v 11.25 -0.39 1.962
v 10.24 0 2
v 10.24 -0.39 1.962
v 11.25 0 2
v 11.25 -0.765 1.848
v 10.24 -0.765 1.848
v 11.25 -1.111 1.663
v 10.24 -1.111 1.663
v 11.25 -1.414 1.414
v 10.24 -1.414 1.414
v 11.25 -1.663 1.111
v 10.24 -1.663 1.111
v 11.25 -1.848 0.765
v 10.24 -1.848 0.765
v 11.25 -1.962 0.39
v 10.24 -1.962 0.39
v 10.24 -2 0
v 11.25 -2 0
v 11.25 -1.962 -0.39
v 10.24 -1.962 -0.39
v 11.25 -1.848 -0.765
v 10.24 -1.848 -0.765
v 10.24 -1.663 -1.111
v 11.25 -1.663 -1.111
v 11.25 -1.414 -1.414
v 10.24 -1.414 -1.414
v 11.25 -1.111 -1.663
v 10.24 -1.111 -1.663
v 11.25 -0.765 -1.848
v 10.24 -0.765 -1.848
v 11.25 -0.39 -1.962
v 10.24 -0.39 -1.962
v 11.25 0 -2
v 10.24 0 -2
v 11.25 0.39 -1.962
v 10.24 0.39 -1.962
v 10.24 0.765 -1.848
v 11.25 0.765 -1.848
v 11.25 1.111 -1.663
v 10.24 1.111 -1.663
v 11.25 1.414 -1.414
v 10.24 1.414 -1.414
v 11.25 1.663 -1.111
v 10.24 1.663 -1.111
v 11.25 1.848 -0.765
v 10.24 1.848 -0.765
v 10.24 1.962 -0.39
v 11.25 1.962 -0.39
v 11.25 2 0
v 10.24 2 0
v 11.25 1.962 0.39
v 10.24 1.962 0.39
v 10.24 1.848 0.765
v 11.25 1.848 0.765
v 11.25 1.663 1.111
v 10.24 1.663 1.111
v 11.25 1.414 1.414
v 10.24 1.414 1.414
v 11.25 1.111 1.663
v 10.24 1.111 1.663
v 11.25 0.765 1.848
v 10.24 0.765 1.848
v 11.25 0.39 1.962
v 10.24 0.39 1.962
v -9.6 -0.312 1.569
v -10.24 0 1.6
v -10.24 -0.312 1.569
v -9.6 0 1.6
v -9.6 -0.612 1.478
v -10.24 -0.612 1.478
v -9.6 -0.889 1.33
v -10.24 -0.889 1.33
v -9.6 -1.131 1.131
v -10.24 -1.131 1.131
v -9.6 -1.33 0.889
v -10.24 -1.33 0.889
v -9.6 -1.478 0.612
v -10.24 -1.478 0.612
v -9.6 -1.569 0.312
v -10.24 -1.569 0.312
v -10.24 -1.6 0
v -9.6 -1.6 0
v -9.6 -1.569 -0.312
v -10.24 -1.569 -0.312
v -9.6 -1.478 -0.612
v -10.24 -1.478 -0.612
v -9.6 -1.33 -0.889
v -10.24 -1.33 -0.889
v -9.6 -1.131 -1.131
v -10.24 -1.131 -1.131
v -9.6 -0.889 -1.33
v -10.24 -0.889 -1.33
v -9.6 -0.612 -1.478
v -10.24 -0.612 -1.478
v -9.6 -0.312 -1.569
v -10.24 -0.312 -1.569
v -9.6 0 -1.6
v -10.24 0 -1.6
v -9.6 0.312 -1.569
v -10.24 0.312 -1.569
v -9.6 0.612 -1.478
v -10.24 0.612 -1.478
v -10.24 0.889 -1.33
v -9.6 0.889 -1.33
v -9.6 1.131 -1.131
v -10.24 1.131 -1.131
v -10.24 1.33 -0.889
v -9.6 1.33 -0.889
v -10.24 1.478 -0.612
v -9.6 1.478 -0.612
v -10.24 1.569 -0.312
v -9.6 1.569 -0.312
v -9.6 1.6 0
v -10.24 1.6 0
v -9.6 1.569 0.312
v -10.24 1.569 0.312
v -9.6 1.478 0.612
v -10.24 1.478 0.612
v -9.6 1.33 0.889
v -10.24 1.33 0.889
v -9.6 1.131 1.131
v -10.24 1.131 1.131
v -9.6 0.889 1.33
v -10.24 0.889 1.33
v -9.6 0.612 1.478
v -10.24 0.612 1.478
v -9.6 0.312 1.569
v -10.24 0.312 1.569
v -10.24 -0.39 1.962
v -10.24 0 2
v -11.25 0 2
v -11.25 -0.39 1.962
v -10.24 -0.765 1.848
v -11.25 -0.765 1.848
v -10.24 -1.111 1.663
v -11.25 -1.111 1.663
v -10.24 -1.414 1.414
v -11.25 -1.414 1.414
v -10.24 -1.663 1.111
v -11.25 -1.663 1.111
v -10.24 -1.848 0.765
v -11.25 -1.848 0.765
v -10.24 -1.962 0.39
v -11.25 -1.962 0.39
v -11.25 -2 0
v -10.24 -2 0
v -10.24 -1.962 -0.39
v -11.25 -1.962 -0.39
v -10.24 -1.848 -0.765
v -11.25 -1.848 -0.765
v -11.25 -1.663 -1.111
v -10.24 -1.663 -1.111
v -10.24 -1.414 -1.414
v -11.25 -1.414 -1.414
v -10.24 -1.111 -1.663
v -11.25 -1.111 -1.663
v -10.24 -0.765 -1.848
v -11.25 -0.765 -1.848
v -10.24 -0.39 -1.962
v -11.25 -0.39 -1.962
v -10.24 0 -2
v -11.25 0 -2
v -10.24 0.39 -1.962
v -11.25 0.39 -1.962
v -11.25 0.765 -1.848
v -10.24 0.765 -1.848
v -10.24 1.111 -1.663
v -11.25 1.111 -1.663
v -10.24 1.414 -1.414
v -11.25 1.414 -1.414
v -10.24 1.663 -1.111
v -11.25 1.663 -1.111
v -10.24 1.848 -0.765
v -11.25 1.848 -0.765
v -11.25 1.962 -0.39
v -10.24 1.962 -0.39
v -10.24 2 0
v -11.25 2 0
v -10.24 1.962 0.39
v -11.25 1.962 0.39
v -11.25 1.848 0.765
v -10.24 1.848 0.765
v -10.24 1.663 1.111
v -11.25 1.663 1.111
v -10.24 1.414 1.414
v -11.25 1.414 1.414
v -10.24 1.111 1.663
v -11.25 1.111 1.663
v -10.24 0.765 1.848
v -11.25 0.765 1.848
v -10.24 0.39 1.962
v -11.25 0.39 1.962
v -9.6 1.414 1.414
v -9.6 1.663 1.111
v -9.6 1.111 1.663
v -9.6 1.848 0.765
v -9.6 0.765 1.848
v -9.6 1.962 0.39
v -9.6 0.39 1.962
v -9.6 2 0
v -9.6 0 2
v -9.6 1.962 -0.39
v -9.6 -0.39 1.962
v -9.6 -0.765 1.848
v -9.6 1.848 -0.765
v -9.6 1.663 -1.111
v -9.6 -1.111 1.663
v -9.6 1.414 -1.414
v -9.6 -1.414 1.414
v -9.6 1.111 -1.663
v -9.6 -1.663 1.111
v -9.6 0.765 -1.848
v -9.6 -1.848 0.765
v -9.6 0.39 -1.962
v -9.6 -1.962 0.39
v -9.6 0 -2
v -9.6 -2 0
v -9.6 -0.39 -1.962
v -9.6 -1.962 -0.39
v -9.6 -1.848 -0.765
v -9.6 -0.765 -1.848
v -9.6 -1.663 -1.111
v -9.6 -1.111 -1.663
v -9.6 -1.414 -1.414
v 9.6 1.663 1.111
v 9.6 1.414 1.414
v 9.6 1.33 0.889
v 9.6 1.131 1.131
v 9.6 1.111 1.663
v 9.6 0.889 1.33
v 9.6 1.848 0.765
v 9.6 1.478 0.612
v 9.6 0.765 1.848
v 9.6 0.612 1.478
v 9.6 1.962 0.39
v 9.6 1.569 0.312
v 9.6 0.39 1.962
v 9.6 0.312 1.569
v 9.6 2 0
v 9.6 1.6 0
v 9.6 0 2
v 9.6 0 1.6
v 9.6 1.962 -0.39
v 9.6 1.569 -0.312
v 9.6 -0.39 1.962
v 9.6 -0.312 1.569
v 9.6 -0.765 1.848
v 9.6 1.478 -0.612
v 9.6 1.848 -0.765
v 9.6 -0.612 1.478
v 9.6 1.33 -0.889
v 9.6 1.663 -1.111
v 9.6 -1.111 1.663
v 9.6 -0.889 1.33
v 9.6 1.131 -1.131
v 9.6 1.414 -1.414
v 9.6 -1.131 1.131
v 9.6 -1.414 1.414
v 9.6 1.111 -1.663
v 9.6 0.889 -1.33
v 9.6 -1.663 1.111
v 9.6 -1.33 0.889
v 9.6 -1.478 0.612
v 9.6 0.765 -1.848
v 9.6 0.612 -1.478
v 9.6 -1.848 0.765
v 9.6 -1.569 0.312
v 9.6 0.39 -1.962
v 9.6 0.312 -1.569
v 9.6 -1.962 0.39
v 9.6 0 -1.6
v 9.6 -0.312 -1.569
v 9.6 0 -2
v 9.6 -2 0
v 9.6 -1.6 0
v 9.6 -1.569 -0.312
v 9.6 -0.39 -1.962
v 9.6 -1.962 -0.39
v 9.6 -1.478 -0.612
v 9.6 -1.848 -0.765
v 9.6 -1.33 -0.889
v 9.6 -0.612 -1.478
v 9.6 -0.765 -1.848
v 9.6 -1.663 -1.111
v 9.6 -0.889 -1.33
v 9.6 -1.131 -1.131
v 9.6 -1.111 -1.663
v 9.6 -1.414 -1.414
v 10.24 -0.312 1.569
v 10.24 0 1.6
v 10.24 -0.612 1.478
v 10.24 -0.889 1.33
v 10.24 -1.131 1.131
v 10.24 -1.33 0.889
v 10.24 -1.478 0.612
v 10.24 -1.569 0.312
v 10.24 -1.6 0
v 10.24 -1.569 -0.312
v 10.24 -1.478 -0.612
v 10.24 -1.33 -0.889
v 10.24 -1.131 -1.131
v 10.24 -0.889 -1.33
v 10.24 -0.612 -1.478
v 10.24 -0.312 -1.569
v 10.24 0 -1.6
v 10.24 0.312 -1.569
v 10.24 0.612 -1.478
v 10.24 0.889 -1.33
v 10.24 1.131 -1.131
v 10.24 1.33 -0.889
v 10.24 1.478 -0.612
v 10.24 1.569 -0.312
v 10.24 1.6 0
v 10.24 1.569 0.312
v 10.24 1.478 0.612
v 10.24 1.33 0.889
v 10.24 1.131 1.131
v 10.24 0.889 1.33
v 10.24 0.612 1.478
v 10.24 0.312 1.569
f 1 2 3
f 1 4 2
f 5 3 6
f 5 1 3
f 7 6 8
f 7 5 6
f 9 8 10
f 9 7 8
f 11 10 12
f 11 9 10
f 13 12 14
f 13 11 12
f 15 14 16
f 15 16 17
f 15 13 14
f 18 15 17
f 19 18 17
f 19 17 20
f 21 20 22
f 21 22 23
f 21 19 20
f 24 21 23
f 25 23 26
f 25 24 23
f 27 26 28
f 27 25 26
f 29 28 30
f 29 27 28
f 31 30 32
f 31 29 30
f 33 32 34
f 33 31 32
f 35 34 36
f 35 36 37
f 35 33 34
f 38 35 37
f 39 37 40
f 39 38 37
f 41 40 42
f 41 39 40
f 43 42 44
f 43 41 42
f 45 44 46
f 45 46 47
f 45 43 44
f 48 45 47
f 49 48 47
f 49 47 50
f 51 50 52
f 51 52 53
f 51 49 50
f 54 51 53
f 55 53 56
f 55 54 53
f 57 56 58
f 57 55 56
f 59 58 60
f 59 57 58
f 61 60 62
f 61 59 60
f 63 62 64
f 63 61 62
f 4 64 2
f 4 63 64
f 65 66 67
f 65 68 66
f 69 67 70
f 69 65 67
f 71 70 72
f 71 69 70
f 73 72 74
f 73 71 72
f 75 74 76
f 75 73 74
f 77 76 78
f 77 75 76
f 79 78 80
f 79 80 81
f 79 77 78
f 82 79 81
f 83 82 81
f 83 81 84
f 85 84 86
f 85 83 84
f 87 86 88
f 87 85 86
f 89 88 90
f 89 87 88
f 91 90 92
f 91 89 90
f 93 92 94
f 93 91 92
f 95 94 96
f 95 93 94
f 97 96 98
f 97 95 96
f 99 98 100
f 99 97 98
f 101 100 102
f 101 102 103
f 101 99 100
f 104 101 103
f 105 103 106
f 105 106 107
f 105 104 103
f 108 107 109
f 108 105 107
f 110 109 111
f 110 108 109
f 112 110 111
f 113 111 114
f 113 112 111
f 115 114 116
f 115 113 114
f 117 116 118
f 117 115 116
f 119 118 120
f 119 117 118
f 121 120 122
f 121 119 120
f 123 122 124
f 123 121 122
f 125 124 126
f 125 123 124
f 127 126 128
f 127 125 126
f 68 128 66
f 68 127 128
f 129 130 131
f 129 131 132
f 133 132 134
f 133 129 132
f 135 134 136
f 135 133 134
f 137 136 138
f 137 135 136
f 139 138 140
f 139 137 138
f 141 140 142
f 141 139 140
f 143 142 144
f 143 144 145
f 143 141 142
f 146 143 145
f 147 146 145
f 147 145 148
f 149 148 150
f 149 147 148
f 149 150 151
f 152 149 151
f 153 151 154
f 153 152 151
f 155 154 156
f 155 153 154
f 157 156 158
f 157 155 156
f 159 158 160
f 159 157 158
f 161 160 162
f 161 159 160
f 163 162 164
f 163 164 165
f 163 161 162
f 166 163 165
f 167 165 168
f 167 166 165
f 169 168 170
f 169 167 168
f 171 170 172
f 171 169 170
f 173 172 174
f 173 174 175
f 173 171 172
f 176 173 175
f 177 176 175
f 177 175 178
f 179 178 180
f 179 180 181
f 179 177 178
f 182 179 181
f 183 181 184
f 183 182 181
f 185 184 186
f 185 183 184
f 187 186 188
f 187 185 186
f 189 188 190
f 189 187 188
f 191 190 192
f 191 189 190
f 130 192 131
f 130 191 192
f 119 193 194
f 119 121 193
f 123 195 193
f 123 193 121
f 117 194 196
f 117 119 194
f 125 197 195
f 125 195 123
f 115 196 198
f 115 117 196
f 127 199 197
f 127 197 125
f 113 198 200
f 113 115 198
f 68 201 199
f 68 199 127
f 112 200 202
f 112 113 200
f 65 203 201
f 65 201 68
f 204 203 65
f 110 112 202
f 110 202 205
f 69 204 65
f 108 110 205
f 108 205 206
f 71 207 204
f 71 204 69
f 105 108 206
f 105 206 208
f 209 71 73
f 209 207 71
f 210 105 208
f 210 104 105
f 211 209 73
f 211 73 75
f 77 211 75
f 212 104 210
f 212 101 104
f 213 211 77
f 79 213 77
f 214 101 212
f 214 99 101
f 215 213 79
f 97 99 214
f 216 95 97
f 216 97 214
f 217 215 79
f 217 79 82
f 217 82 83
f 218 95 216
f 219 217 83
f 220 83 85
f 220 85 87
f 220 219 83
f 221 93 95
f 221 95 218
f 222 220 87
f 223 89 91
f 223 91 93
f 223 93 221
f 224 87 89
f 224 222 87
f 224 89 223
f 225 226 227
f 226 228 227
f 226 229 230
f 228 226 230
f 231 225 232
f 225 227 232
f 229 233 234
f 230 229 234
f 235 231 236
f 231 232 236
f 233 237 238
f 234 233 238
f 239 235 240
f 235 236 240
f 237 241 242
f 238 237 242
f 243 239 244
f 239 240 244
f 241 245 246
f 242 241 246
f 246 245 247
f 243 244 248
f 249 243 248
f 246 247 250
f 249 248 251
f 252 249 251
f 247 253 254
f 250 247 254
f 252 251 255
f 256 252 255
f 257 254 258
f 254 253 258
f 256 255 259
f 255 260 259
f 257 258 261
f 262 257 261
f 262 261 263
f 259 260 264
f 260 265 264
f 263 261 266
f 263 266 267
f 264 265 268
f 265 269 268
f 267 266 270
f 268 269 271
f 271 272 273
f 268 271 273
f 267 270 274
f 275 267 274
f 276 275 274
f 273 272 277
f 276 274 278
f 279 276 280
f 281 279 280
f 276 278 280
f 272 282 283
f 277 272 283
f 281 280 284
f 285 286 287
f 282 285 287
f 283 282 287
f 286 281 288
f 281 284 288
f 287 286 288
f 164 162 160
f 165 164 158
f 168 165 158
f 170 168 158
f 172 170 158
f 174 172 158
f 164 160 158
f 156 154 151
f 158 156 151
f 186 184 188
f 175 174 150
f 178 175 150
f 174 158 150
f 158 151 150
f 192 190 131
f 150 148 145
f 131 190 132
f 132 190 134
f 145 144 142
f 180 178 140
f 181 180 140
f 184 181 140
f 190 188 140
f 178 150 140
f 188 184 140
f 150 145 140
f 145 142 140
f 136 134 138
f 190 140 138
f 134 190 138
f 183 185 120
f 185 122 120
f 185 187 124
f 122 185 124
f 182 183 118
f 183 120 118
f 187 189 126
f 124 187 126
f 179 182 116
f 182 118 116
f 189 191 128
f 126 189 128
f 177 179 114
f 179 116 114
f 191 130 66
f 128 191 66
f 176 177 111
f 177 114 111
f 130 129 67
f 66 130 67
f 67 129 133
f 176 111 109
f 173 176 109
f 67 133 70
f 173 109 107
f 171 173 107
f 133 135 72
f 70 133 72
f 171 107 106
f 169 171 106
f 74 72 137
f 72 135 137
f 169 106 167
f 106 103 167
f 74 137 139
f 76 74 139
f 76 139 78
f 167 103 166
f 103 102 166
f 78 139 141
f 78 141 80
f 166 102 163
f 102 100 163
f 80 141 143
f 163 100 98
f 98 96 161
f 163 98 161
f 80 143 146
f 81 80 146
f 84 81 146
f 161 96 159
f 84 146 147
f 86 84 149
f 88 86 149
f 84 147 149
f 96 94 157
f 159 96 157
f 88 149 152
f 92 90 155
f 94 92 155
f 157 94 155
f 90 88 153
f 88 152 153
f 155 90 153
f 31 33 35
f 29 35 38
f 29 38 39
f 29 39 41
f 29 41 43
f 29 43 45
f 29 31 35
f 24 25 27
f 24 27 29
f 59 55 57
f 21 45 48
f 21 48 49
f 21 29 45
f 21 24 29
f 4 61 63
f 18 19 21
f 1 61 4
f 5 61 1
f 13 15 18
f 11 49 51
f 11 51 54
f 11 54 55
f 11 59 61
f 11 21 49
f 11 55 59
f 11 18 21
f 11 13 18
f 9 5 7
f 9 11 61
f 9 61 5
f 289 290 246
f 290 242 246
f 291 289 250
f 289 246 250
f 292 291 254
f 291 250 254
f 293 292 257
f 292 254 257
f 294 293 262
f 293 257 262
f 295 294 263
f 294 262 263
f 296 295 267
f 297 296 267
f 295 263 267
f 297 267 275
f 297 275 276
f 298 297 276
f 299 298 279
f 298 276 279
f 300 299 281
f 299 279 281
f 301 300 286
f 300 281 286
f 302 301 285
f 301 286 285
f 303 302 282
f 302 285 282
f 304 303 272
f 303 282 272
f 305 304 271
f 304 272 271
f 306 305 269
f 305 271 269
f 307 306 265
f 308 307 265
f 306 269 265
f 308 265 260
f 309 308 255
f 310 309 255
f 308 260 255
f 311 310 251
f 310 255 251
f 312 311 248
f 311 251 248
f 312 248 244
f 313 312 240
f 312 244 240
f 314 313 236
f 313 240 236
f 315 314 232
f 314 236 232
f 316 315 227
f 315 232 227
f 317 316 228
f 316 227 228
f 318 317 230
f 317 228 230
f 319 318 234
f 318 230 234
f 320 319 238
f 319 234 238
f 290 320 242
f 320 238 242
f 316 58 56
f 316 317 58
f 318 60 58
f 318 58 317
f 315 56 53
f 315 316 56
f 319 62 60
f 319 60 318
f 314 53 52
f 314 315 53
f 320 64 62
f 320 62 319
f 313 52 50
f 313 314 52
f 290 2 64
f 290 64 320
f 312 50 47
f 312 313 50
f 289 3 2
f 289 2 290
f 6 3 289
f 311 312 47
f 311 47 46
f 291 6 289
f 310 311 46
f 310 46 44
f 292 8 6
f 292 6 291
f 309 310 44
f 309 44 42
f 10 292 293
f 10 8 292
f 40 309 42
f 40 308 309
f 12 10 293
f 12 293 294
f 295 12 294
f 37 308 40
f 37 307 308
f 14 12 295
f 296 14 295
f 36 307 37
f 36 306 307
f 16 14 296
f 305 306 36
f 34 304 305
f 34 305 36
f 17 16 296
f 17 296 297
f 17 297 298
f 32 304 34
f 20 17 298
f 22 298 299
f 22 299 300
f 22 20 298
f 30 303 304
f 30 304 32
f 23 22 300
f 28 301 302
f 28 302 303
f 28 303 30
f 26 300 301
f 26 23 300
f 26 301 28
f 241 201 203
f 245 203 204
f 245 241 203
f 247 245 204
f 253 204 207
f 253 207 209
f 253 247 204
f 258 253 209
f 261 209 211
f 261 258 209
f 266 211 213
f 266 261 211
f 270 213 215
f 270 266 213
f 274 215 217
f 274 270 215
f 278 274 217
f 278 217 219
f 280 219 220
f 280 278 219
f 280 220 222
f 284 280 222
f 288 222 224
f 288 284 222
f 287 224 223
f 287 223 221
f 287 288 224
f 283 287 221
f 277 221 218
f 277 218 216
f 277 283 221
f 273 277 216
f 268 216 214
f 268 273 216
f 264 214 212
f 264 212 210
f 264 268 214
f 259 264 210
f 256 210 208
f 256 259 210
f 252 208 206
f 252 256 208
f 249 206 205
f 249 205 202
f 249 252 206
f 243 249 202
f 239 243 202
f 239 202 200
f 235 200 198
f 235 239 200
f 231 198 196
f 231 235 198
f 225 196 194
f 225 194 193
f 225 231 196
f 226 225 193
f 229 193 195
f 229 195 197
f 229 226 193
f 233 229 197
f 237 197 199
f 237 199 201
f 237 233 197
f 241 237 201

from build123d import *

# Parameters (mm, degrees)
SKETCH1_R           = 2
BOSS_EXTRUDE1_DEPTH = 11.25
SKETCH3_W           = 0.64
SKETCH3_H           = 0.4


with BuildPart() as part:
    # Sketch1 → Boss-Extrude1 (new, symmetric)
    with BuildSketch(Plane(origin=(0, 0, 0), x_dir=(0, 0, -1), z_dir=(1, 0, 0))):
        with Locations(Location((0, 0, 0), (0, 0, 180))):
            Circle(SKETCH1_R)
    extrude(amount=BOSS_EXTRUDE1_DEPTH, both=True)

    # Sketch3 → Cut-Revolve1 (revolve, cut)
    with BuildSketch(Plane(origin=(0, 0, 0), x_dir=(1, 0, 0), z_dir=(0, 1, 0)), mode=Mode.PRIVATE) as cut_revolve1_sk:
        with Locations((-9.92, 1.8)):
            Rectangle(SKETCH3_W, SKETCH3_H)
    cut_revolve1 = revolve(cut_revolve1_sk.sketch.rotate(Axis((-12.375, 0, 0), (1, 0, 0)), 180), axis=Axis((-12.375, 0, 0), (1, 0, 0)), mode=Mode.SUBTRACT)

    # Mirror1: Cut-Revolve1 across plane
    add(cut_revolve1.mirror(Plane(origin=(0, 0, 0), x_dir=(0, 0, 1), z_dir=(1, 0, 0))), mode=Mode.SUBTRACT)


solid = part.part
